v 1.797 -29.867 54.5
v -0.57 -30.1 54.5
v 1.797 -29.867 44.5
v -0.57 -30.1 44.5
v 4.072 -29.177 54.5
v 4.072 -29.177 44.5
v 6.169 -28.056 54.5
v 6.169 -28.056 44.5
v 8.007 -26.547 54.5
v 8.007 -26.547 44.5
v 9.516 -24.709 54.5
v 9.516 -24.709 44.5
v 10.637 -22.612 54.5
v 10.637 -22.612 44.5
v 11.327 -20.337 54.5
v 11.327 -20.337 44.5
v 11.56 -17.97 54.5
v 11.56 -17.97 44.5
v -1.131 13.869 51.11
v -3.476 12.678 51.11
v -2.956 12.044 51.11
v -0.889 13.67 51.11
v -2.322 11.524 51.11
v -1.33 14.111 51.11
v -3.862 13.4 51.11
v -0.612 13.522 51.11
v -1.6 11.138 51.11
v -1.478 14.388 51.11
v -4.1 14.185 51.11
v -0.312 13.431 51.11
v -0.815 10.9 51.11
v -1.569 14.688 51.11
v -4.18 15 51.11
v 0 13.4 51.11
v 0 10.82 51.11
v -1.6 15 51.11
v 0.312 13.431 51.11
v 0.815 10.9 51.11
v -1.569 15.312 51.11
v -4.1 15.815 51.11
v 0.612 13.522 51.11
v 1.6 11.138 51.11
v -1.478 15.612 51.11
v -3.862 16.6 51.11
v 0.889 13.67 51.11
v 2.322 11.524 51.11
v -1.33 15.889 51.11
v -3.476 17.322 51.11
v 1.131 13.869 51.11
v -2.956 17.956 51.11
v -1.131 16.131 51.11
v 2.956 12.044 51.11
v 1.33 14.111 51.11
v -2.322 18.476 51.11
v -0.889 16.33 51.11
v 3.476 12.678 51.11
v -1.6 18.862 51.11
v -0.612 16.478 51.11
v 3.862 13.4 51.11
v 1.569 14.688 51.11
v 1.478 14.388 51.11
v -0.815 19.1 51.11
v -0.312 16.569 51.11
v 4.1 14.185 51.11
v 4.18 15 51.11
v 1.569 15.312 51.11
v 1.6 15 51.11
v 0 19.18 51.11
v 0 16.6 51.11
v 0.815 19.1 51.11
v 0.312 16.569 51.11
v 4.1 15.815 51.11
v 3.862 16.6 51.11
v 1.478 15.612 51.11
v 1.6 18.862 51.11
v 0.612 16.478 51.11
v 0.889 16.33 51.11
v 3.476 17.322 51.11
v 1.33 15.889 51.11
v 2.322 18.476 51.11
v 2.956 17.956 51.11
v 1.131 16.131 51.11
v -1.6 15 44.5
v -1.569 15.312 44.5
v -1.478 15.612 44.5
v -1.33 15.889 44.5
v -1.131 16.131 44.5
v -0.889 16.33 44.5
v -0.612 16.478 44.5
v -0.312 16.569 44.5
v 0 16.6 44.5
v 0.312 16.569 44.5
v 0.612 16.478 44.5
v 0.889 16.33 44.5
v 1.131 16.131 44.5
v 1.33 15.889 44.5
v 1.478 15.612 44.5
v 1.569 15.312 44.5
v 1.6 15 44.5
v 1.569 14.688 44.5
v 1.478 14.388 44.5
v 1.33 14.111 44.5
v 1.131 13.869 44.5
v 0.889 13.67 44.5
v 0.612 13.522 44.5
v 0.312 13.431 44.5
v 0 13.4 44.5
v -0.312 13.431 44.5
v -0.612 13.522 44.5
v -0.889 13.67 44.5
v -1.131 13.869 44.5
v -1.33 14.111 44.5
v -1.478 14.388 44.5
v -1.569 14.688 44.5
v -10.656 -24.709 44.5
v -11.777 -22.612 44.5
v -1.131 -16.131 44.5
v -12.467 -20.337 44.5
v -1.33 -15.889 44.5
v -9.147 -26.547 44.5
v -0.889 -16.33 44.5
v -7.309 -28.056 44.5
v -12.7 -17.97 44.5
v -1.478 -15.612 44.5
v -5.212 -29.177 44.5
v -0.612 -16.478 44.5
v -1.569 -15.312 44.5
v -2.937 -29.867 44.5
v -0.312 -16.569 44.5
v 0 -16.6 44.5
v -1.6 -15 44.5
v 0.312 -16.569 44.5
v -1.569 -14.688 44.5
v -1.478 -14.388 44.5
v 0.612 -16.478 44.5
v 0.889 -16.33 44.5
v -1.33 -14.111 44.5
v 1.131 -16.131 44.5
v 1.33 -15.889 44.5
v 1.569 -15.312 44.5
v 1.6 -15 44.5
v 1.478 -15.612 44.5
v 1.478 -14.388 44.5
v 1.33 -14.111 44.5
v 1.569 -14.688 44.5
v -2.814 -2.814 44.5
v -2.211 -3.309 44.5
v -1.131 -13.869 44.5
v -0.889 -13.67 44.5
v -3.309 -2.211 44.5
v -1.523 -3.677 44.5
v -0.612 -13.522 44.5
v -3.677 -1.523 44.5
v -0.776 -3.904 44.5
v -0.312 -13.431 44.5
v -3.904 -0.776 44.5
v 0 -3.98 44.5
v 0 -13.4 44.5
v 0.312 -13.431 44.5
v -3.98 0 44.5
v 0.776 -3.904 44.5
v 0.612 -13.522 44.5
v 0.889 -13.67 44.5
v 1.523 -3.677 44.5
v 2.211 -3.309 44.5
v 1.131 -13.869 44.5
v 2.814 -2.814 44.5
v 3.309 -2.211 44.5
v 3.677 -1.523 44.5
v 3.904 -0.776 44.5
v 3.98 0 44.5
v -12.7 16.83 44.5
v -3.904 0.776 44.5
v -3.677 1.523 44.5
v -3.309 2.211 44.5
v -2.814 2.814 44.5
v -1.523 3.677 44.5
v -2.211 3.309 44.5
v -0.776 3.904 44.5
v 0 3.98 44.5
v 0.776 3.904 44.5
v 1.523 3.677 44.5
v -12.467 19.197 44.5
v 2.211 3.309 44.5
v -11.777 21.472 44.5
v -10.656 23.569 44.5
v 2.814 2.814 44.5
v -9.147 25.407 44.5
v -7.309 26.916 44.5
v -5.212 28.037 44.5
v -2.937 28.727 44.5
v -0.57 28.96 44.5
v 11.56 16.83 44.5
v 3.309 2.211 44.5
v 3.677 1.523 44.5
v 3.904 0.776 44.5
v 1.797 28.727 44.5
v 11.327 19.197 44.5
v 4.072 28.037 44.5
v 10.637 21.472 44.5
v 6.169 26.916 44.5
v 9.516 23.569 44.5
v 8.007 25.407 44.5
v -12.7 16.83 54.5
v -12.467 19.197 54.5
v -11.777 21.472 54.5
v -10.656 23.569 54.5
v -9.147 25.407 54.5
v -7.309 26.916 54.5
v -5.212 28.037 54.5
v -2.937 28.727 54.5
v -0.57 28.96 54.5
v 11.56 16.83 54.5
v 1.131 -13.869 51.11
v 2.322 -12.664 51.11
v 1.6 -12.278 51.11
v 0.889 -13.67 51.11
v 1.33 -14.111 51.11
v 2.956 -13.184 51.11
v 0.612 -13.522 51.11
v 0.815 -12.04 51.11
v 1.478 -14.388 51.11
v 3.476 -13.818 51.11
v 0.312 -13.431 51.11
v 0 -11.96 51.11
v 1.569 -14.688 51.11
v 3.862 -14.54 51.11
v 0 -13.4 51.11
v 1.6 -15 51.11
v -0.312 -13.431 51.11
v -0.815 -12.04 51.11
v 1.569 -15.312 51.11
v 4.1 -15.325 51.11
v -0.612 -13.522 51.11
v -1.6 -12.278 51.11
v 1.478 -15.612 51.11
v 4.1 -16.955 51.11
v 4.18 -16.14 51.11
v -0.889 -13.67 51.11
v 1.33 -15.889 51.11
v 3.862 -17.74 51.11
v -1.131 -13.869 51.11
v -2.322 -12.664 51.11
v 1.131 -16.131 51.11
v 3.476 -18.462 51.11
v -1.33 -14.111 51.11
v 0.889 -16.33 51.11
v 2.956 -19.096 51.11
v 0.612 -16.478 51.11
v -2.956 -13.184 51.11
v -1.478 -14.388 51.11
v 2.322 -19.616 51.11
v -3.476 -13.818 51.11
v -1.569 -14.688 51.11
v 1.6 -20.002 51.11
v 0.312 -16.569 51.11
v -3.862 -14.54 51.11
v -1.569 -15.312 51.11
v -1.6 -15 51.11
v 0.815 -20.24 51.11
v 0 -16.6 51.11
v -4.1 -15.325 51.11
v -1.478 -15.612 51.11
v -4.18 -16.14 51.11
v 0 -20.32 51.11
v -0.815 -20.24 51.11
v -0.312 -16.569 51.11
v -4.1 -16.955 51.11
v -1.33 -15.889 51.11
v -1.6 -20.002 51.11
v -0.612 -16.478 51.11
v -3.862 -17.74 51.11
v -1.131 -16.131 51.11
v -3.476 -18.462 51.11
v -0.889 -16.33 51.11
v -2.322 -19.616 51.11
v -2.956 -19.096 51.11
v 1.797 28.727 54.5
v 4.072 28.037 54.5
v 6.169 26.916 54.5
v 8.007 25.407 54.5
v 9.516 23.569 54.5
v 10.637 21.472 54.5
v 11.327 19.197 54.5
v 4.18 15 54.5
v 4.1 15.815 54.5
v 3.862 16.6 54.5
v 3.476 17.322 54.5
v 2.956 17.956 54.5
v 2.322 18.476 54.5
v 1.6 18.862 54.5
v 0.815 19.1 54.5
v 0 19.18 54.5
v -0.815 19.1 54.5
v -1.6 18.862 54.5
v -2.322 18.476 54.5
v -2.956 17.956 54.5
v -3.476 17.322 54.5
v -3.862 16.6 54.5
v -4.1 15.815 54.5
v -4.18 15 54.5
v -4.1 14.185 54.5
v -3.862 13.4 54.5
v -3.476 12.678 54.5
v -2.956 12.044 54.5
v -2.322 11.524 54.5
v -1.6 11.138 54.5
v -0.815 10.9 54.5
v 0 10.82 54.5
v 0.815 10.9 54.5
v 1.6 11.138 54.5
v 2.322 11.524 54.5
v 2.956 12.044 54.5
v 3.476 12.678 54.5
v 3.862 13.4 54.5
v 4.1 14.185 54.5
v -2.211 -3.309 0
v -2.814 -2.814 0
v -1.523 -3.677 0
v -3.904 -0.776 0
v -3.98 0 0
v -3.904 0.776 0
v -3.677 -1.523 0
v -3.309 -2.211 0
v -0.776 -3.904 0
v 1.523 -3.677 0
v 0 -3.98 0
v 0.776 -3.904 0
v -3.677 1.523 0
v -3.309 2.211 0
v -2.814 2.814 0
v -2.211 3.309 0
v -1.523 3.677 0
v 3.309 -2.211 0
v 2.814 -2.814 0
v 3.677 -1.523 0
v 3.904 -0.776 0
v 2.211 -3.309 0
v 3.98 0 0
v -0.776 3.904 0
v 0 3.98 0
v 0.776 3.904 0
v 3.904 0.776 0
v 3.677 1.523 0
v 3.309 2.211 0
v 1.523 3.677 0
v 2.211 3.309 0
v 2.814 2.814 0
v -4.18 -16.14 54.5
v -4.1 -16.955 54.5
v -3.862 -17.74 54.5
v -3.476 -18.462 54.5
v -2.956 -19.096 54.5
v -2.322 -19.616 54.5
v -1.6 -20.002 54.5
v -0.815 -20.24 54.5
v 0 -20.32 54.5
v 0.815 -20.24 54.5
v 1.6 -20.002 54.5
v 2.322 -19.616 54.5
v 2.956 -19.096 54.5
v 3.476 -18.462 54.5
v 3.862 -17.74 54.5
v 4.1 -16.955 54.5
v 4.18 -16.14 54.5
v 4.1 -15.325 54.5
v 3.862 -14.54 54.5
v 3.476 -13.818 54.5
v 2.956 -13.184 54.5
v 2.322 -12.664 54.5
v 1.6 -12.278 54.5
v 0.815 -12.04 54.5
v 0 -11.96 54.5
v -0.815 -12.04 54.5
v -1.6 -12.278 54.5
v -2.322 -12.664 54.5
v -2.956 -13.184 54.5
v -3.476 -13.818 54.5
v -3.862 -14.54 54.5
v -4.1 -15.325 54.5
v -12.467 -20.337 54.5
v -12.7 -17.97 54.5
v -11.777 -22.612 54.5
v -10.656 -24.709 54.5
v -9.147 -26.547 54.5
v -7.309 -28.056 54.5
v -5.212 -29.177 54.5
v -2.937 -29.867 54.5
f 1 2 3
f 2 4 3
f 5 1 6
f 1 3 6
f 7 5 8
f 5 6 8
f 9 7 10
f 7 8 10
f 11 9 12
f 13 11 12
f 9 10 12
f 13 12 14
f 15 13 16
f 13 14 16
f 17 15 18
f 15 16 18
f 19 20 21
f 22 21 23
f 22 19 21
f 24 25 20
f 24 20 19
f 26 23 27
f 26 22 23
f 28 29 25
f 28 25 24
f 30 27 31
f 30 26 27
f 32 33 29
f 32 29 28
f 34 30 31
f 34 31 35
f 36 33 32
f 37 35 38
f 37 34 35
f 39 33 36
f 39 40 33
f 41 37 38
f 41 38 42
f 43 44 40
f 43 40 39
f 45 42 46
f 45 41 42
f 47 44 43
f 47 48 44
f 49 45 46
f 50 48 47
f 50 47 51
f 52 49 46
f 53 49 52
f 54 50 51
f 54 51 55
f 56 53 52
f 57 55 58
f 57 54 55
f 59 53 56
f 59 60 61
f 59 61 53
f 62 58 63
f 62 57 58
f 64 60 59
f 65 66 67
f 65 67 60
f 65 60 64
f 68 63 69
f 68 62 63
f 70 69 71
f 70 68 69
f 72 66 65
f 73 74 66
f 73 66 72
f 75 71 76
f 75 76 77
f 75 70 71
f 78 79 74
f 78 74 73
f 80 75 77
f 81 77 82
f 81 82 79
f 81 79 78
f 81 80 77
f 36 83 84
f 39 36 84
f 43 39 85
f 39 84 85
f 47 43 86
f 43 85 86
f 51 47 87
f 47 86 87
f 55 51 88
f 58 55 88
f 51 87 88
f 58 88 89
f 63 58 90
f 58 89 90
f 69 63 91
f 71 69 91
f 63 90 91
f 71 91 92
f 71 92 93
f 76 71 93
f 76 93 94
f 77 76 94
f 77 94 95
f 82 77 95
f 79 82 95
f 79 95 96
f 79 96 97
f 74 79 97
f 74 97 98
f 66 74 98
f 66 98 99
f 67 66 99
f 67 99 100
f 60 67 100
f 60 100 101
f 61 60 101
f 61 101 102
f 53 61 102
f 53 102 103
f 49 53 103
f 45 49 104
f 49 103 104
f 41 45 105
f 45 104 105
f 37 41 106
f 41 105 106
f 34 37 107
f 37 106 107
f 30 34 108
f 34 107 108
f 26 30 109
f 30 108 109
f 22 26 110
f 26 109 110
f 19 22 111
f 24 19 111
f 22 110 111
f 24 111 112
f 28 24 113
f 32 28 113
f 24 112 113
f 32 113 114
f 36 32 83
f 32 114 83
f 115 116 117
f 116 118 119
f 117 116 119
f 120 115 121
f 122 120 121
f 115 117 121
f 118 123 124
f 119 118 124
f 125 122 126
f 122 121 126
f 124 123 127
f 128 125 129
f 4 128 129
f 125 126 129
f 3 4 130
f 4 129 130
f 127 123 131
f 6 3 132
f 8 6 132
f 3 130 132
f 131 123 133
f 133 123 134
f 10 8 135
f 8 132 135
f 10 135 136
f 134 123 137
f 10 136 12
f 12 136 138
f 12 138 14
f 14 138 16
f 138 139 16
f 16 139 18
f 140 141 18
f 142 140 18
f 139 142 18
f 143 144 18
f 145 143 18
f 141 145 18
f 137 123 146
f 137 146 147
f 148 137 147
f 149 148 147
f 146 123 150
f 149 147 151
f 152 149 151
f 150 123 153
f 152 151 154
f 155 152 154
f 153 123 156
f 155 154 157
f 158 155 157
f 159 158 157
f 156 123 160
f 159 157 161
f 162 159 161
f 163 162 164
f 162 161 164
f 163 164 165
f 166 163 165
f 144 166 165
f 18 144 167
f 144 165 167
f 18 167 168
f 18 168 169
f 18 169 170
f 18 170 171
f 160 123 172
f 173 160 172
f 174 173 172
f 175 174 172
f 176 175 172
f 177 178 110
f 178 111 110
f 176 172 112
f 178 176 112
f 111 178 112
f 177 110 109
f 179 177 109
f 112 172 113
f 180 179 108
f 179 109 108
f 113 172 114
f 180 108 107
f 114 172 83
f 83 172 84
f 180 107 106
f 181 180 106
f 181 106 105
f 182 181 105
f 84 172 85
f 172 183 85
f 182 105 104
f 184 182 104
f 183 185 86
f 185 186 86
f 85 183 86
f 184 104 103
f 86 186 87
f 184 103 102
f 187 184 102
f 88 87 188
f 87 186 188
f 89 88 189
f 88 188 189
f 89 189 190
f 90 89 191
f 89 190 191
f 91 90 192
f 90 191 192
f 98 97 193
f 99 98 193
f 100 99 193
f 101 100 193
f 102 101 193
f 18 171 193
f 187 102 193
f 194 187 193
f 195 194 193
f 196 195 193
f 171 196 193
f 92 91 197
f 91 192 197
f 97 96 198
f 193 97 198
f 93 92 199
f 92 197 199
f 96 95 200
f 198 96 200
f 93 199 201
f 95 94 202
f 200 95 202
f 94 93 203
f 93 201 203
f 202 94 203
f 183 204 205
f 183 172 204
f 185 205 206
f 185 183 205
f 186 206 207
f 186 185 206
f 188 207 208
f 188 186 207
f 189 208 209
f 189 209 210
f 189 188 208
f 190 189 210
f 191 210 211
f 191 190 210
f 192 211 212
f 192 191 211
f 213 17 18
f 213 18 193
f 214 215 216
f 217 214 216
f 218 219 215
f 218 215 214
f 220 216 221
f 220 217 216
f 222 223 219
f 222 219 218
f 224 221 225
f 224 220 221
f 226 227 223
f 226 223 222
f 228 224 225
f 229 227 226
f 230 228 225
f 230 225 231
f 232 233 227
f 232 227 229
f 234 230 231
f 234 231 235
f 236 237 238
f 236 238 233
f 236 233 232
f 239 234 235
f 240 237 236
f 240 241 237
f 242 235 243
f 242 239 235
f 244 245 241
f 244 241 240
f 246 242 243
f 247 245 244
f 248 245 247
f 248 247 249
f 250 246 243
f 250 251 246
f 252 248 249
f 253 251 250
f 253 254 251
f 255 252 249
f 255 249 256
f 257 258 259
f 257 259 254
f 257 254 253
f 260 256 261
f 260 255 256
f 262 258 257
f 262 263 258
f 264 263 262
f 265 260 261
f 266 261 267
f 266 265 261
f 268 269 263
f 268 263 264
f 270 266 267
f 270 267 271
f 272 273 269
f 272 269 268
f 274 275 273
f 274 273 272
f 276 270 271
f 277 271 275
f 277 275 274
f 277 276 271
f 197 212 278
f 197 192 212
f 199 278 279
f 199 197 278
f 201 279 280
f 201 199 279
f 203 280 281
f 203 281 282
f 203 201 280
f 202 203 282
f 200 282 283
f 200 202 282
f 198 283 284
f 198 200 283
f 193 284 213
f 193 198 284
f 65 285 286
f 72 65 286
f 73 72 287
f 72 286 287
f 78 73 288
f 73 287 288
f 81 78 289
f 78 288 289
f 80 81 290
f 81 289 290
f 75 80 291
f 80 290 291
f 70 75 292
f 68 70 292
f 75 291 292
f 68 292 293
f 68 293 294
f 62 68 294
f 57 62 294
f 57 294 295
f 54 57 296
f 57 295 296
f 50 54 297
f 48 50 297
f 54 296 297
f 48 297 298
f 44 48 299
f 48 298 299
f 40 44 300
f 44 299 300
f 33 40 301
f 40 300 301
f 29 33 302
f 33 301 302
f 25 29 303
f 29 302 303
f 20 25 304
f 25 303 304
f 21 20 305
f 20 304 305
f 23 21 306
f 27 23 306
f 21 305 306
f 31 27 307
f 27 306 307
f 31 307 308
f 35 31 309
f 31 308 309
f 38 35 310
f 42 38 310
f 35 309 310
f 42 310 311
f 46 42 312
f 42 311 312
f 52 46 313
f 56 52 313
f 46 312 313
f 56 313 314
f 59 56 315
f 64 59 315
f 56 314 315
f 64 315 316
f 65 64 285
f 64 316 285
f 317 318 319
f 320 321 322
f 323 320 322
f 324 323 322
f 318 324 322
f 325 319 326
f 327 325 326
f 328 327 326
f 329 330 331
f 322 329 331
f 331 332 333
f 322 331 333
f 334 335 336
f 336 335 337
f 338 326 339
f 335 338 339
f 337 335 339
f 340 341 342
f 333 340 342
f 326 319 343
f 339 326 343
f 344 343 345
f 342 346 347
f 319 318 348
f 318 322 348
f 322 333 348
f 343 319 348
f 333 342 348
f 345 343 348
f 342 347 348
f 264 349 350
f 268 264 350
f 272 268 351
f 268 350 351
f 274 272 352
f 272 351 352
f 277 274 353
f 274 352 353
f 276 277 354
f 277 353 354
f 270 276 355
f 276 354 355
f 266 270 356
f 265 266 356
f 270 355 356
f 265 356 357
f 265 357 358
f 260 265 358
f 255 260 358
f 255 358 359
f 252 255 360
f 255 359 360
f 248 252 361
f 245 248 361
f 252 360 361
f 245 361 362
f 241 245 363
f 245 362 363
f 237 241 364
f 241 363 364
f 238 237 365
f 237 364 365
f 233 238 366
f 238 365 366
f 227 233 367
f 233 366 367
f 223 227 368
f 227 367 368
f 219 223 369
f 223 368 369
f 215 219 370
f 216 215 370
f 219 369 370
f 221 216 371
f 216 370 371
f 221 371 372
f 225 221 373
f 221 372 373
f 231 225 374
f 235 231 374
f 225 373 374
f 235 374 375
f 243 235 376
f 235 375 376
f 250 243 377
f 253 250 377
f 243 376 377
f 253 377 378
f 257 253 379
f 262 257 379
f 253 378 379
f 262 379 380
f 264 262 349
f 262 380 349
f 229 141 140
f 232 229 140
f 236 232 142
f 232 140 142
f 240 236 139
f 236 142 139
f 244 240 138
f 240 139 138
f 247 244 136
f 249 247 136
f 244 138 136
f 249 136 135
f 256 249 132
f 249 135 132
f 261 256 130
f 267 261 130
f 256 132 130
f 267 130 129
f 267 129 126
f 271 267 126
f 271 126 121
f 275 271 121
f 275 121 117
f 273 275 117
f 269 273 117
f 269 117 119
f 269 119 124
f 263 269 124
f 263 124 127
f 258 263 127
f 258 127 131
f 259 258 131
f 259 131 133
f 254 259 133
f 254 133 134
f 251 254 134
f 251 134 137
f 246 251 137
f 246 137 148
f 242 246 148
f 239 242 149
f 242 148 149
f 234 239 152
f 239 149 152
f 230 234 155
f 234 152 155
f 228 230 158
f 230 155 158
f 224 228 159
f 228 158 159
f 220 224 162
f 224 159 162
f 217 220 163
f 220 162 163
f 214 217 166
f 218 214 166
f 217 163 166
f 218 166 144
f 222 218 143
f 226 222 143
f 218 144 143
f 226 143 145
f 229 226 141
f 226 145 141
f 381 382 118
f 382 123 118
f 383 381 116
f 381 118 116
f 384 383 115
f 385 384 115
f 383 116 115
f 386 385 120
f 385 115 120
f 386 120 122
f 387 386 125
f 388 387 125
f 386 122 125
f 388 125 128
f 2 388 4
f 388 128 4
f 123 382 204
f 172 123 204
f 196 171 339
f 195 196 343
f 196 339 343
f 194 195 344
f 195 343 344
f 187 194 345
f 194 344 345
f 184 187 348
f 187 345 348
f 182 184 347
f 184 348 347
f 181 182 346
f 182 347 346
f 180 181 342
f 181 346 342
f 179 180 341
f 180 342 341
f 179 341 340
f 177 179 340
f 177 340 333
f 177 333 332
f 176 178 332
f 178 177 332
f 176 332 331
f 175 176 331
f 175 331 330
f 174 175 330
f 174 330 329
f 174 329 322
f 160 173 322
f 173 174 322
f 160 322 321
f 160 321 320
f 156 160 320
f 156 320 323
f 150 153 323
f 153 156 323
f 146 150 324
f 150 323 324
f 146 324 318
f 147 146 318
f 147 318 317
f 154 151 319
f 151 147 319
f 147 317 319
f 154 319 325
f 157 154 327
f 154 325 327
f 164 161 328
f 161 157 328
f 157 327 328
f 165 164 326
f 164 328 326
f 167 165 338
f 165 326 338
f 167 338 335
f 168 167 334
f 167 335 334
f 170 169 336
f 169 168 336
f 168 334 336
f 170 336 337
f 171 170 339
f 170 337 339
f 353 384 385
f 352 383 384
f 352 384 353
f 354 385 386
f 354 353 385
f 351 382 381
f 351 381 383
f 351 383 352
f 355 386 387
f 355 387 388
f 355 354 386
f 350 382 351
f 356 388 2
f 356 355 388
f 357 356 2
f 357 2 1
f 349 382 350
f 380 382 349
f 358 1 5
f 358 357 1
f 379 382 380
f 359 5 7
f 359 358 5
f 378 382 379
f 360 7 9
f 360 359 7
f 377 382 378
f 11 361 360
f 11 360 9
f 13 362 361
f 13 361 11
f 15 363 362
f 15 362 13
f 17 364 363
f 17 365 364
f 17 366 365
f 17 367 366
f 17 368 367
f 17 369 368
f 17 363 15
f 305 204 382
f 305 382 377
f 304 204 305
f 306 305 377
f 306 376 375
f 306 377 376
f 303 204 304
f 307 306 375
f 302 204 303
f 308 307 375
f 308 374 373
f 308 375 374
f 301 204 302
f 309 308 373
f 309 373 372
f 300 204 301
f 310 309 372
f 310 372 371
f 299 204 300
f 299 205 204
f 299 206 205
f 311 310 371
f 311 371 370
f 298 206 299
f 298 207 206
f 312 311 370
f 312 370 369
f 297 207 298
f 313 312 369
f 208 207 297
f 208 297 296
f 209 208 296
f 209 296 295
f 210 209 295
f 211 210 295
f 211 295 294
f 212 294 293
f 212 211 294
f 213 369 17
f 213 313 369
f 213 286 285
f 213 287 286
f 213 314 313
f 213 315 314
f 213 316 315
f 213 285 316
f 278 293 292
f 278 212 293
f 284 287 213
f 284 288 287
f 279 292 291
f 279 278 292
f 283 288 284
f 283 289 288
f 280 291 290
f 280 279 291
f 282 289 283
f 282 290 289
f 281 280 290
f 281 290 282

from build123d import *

# Parameters (mm, degrees)
SKETCH1_R             = 3.98
BOSS_EXTRUDE1_DEPTH   = 54.5
SKETCH3_W             = 24.26
SKETCH3_H             = 59.06
BOSS_EXTRUDE2_DEPTH   = 10
SKETCH4_R             = 1.6
CUT_EXTRUDE1_DEPTH    = 56.204619372
CROQUIS2_R            = 4.18
CORTAR_EXTRUIR2_DEPTH = 3.39
REDONDEO1_R           = 12.13


with BuildPart() as part:
    # Sketch1 → Boss-Extrude1 (new body)
    with BuildSketch(Plane.XY):
        Circle(SKETCH1_R)
    extrude(amount=BOSS_EXTRUDE1_DEPTH)

    # Sketch3 → Boss-Extrude2 (add)
    with BuildSketch(Plane.XY.offset(54.5)):
        with Locations((-0.57, -0.57)):
            Rectangle(SKETCH3_W, SKETCH3_H)
    extrude(amount=-BOSS_EXTRUDE2_DEPTH)

    # Sketch4 → Cut-Extrude1 (cut, through all)
    with BuildSketch(Plane(origin=(0, 0, 44.5), x_dir=(-1, 0, 0), z_dir=(0, 0, -1))):
        with Locations((0, 15)):
            Circle(SKETCH4_R)
        with Locations(Location((0, -15, 0), (0, 0, 180))):
            Circle(SKETCH4_R)
    extrude(amount=-CUT_EXTRUDE1_DEPTH, mode=Mode.SUBTRACT)

    # Croquis2 → Cortar-Extruir2 (cut)
    with BuildSketch(Plane.XY.offset(54.5)):
        with Locations((0, 15)):
            Circle(CROQUIS2_R)
        with Locations(Location((0, -16.14, 0), (0, 0, 180))):
            Circle(CROQUIS2_R)
    extrude(amount=-CORTAR_EXTRUIR2_DEPTH, mode=Mode.SUBTRACT)

    # Redondeo1
    redondeo1_edges = [part.edges().sort_by_distance(p)[0] for p in [
        (11.56, -30.1, 49.5),
        (-12.7, -30.1, 49.5),
        (-12.7, 28.96, 49.5),
        (11.56, 28.96, 49.5),
    ]]
    fillet(redondeo1_edges, radius=REDONDEO1_R - 0.0001)  # a hair under: the kernel refuses the full size


solid = part.part
